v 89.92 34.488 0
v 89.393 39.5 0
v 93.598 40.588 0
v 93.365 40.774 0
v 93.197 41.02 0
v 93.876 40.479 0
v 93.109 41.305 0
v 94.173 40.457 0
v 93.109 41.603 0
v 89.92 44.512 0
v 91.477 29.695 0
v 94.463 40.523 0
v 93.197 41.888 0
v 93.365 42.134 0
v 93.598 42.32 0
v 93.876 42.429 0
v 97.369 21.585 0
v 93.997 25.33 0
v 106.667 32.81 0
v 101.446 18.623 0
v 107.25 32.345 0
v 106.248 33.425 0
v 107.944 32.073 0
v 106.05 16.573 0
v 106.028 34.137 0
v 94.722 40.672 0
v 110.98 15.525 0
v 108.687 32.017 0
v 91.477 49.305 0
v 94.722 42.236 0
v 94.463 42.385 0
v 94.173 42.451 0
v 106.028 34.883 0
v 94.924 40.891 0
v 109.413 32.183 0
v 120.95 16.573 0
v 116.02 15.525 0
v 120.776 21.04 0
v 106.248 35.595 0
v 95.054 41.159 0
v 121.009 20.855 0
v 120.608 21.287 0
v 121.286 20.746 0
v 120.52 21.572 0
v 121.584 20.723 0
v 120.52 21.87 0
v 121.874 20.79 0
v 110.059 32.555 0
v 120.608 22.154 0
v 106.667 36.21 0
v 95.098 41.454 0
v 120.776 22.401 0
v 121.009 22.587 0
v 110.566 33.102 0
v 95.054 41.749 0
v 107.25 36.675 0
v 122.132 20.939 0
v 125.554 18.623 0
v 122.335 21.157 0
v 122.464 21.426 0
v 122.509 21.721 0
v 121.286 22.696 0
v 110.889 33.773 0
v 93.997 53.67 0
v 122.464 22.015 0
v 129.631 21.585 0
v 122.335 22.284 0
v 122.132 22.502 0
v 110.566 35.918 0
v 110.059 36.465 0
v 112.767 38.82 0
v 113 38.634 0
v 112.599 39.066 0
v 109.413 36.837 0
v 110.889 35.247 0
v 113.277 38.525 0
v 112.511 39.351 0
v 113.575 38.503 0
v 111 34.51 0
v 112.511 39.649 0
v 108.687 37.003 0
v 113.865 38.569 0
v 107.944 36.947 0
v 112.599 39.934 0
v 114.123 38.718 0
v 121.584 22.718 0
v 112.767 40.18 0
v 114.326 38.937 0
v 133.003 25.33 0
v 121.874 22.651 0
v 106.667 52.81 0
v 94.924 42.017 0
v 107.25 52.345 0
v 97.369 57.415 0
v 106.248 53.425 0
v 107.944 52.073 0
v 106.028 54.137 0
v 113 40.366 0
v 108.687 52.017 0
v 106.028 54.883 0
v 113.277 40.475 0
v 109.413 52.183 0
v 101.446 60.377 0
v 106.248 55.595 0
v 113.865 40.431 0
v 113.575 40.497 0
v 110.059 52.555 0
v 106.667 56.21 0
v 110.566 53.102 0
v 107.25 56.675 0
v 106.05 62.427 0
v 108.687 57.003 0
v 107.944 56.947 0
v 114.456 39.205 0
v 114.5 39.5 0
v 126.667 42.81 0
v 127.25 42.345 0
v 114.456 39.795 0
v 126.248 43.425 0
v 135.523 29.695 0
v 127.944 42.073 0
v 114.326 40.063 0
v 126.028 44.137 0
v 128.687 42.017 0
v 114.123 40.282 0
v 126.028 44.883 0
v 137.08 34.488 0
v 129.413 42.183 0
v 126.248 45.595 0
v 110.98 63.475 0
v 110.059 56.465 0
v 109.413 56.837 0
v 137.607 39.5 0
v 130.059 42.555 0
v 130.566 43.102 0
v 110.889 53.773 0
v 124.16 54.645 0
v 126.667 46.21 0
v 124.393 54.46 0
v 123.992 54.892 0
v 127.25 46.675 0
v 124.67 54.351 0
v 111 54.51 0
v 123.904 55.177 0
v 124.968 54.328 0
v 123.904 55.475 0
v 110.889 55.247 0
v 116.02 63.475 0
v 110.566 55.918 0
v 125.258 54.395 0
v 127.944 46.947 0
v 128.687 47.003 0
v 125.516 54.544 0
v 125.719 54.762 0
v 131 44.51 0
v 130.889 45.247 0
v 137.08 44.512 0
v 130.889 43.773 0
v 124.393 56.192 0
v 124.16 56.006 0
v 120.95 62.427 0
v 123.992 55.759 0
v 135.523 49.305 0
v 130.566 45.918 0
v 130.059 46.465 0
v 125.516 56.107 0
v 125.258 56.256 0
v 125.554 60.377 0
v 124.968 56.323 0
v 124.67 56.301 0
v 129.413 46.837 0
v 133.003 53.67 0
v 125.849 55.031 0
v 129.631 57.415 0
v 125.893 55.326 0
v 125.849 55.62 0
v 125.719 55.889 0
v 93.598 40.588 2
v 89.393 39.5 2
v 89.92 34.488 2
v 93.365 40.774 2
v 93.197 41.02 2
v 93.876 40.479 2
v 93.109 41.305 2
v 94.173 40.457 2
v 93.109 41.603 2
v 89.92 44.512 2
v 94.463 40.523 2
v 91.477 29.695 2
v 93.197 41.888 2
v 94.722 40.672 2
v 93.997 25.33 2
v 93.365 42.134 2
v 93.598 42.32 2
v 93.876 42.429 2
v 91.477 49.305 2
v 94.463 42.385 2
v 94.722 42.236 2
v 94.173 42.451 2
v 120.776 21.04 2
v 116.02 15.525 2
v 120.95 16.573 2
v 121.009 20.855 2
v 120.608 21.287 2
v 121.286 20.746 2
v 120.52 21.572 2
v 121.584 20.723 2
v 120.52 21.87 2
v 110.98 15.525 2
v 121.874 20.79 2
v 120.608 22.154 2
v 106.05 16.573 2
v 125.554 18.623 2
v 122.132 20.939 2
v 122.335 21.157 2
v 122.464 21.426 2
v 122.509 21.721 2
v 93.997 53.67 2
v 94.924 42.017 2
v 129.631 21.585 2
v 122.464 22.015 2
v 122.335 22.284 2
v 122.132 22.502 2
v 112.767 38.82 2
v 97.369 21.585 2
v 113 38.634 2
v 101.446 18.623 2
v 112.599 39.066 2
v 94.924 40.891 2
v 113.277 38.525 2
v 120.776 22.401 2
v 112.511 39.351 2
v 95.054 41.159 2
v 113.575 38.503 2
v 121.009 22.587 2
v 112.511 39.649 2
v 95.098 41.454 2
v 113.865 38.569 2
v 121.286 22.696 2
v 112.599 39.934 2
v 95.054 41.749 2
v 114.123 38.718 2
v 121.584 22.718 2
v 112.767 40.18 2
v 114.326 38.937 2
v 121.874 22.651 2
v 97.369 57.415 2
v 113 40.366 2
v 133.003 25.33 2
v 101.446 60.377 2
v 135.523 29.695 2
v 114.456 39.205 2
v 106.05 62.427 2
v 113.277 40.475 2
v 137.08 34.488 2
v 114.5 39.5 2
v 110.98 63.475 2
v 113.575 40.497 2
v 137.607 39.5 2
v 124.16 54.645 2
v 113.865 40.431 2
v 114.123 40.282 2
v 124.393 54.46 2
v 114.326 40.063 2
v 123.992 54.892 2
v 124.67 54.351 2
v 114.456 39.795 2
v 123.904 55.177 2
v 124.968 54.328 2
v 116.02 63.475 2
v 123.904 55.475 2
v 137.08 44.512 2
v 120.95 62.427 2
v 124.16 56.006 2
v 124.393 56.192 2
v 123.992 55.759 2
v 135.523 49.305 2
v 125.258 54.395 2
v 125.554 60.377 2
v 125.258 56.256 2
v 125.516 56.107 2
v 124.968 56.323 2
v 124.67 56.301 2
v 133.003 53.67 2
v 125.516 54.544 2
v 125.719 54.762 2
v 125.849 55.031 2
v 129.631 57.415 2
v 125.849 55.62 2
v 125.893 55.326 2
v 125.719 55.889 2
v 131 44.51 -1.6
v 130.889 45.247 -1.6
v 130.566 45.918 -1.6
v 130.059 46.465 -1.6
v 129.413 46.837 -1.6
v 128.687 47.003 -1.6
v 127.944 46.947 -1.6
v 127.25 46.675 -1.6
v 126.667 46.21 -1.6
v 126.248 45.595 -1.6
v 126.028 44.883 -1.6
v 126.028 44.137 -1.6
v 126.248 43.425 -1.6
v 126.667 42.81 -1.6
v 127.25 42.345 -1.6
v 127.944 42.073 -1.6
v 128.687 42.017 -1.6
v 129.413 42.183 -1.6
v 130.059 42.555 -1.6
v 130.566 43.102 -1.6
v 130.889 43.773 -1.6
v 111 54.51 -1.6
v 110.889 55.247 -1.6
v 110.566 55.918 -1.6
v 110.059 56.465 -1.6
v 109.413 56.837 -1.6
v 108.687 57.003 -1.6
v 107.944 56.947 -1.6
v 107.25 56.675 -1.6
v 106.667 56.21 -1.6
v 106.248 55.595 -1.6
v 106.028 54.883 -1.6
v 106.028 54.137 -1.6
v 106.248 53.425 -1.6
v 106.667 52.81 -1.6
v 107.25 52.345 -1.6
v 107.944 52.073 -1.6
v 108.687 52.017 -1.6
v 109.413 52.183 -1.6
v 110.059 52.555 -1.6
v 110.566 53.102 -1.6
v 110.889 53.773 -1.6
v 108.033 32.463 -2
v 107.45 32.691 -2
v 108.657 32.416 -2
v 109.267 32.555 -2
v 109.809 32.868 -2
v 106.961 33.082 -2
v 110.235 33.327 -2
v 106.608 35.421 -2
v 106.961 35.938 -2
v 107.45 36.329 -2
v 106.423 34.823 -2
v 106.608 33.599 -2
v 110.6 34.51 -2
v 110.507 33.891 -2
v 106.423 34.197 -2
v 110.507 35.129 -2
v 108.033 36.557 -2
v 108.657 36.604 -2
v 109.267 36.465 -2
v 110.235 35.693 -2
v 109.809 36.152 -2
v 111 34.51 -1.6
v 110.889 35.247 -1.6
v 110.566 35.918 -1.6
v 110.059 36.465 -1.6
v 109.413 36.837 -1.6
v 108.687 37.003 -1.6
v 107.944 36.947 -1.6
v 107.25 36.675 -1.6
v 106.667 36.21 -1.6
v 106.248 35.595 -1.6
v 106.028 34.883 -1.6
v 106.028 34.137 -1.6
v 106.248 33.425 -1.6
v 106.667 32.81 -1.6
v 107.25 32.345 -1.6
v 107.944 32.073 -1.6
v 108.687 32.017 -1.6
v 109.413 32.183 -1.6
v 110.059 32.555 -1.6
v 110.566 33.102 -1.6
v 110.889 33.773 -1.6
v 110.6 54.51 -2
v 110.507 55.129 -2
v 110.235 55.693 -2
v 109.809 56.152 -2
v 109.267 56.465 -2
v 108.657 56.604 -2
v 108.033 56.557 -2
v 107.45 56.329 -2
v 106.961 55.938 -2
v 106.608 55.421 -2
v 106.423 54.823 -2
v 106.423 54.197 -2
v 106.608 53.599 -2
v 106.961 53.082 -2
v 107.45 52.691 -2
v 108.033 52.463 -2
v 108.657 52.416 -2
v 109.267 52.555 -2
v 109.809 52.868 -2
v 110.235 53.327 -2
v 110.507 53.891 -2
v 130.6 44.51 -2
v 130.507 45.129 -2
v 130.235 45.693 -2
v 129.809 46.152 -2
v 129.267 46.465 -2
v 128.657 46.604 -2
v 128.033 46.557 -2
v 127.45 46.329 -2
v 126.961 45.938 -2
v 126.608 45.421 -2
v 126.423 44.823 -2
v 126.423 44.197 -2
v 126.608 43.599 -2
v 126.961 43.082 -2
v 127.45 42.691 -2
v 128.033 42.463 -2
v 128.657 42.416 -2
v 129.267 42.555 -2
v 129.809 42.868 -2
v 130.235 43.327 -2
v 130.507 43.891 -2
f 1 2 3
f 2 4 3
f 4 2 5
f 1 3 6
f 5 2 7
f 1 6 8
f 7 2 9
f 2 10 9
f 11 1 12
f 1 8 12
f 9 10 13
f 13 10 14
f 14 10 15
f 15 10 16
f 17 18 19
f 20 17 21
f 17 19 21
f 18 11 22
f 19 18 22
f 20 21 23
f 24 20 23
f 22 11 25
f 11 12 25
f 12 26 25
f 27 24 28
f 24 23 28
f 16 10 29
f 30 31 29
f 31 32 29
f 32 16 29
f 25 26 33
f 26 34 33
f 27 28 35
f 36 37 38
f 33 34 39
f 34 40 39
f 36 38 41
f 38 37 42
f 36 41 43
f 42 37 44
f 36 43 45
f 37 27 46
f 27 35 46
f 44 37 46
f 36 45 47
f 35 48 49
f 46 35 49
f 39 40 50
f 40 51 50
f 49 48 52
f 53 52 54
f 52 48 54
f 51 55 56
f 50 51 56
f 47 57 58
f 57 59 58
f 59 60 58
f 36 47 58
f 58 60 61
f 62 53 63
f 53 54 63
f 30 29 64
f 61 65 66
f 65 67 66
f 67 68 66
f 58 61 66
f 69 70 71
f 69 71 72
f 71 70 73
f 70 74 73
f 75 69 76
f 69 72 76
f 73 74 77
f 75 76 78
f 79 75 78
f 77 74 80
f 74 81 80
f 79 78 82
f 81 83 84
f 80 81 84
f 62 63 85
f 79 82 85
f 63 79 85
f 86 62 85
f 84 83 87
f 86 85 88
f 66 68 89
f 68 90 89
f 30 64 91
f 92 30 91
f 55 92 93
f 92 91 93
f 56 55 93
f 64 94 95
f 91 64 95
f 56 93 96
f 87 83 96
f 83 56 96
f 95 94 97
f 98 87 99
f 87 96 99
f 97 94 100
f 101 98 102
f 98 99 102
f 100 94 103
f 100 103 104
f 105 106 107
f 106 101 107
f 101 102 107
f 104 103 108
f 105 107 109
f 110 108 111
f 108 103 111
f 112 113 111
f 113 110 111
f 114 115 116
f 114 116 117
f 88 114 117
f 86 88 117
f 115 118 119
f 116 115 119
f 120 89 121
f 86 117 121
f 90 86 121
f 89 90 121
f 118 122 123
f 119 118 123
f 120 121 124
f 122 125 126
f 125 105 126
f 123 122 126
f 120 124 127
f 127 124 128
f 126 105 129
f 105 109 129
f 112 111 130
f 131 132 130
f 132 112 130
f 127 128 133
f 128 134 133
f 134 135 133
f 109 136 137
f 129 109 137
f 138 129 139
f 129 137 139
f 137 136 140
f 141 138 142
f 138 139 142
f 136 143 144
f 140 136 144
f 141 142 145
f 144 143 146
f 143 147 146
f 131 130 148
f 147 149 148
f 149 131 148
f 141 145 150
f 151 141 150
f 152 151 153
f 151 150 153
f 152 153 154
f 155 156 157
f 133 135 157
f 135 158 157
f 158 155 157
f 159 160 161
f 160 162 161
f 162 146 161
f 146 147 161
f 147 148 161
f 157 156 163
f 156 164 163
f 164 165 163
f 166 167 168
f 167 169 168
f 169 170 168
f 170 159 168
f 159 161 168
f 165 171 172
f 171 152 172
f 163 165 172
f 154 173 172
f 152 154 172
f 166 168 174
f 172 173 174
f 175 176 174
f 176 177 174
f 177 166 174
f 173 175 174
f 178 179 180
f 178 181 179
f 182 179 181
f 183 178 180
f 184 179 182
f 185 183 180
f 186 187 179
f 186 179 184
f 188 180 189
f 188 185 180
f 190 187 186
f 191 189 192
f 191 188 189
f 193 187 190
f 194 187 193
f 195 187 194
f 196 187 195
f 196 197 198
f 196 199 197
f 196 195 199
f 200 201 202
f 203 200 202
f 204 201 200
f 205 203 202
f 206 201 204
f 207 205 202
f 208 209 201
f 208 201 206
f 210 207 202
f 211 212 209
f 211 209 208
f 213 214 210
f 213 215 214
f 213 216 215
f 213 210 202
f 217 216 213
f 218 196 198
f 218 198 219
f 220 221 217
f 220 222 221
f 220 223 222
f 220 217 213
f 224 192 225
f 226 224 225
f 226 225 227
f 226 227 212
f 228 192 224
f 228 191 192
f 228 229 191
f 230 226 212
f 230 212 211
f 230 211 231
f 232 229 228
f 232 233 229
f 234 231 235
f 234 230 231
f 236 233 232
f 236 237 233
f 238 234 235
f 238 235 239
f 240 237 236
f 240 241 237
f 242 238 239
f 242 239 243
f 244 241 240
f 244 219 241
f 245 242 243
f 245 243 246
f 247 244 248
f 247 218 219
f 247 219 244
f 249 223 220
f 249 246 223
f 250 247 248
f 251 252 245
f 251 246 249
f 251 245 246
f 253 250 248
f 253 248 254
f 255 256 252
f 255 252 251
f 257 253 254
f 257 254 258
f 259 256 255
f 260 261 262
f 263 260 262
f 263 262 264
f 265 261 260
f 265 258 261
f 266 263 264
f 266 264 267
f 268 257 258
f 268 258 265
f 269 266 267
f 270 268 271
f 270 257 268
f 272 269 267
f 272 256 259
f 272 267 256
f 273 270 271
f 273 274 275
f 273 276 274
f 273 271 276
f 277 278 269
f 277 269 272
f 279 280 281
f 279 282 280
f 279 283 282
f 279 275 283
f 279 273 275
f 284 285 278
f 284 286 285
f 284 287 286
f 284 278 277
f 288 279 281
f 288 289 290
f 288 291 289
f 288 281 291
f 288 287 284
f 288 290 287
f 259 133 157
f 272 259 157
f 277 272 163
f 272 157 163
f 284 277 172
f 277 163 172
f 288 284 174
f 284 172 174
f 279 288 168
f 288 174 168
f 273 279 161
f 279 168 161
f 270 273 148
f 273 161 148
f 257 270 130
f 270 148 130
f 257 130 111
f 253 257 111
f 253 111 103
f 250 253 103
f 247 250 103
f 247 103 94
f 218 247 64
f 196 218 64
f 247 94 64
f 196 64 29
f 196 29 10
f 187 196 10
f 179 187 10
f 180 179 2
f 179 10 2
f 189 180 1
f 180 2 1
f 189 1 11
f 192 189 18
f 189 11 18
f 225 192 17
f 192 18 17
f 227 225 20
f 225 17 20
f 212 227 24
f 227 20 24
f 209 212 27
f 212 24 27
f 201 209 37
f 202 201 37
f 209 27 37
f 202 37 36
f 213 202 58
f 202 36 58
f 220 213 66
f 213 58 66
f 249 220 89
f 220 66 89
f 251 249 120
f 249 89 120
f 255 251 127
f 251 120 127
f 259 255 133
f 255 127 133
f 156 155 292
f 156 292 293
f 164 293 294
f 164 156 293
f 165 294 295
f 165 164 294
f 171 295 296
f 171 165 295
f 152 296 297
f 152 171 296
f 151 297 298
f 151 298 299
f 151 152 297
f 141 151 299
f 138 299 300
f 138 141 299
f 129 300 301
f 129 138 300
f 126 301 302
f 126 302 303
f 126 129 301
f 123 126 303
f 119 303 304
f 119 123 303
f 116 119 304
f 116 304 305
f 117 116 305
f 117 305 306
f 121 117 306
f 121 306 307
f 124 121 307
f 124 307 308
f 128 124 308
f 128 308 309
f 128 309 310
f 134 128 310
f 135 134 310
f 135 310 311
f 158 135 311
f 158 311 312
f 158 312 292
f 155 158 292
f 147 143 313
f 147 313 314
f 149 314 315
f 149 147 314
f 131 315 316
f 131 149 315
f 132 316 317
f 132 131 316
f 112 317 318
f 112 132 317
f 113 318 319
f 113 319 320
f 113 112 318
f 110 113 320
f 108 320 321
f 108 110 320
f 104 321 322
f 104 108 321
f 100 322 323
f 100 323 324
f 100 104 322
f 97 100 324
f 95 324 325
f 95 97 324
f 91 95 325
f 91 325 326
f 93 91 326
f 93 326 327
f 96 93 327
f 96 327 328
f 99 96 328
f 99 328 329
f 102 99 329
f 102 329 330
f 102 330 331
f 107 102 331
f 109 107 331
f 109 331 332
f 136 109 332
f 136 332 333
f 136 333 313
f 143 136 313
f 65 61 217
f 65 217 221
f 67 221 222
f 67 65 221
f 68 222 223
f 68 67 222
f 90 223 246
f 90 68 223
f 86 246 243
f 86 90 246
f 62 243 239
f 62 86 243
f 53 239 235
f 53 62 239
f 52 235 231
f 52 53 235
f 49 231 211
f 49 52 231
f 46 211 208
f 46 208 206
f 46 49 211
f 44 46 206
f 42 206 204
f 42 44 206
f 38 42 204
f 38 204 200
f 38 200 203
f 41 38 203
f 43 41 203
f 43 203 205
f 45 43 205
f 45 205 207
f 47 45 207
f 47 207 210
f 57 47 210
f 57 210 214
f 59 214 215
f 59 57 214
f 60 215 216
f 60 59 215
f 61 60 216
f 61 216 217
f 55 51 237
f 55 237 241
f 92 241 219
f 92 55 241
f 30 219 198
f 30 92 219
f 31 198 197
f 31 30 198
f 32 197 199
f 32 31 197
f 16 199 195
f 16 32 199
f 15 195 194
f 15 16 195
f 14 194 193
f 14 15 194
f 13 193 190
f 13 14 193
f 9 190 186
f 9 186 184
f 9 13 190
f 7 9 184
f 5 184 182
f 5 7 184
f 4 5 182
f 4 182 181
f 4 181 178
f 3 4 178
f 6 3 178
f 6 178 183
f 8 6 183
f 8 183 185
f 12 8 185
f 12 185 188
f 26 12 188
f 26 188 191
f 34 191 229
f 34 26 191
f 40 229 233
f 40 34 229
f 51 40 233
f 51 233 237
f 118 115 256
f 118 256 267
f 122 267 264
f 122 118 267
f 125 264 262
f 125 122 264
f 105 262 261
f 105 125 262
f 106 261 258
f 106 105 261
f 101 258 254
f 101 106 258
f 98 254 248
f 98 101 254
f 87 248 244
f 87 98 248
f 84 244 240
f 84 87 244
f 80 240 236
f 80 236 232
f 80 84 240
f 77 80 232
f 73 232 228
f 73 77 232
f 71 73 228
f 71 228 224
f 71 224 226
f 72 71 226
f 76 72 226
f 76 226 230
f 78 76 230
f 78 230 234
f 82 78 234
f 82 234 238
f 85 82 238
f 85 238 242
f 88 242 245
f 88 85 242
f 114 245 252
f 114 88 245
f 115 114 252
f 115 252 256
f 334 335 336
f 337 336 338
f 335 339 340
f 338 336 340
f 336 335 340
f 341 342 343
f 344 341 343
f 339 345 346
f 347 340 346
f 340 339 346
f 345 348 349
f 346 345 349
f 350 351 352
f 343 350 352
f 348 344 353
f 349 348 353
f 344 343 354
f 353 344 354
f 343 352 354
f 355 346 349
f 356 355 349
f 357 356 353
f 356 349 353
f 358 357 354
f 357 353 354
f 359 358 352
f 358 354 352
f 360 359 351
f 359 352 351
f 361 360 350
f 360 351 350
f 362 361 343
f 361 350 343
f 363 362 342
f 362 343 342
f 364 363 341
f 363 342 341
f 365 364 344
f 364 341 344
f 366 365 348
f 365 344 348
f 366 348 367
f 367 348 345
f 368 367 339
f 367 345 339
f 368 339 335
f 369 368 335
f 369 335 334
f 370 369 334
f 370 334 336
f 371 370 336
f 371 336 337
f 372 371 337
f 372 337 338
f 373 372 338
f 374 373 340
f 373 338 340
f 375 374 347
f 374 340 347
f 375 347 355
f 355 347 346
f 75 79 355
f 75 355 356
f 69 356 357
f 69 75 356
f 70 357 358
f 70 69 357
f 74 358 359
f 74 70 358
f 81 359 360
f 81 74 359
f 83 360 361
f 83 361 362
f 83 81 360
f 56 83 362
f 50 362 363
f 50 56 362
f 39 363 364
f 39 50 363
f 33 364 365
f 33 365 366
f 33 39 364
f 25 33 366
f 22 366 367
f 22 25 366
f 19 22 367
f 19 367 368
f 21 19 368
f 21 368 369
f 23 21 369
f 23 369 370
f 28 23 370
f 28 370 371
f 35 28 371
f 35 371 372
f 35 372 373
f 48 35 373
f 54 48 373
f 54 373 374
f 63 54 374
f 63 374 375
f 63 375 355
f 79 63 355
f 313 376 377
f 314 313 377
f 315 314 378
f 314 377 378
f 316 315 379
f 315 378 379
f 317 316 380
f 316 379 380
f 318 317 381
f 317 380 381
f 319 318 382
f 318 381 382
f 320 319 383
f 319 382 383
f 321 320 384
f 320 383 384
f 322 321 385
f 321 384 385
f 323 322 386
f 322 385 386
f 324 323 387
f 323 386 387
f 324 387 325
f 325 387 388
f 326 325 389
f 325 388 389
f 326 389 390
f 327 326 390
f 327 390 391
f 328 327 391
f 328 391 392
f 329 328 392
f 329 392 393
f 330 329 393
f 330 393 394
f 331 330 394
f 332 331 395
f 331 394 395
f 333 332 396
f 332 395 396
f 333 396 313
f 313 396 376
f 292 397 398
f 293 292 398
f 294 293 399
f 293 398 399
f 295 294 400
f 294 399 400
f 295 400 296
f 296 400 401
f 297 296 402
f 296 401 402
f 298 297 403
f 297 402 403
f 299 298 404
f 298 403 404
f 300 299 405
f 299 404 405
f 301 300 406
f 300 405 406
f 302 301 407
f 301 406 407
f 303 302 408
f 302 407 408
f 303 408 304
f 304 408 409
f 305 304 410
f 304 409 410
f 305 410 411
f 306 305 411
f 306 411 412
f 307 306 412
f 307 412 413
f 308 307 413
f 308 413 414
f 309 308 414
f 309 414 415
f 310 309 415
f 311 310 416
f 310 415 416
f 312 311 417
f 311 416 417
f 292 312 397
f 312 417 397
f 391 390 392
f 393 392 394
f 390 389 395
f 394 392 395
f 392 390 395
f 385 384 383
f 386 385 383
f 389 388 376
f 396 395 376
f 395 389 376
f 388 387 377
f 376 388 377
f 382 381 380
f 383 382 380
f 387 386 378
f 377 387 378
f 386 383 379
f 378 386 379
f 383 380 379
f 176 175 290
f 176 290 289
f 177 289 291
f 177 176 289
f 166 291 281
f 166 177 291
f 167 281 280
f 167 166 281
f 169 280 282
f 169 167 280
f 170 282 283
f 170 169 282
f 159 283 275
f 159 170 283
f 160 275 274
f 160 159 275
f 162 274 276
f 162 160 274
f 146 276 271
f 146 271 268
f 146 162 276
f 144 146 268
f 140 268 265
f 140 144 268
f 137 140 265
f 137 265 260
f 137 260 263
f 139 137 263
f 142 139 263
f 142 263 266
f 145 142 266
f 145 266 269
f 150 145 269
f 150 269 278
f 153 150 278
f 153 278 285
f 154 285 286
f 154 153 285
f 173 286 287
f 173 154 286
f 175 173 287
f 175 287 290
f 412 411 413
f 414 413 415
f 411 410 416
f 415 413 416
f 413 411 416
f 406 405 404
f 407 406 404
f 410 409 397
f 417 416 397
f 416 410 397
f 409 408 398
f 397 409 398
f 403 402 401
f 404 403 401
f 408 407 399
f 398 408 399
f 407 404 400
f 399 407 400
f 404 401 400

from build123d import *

# Parameters (mm, degrees)
SKETCH_R     = 24.107232
SKETCH_R_2   = 1
PAD_DEPTH    = 2
SKETCH001_R  = 2.5
PAD001_DEPTH = 4
CHAMFER_SIZE = 0.4


with BuildPart() as part:
    # Sketch → Pad (new body)
    with BuildSketch(Plane.XY):
        with Locations((113.5, 39.5)):
            Circle(SKETCH_R)
        with Locations((124.893001, 55.325597)):
            Circle(SKETCH_R_2, mode=Mode.SUBTRACT)
        with Locations((94.09813, 41.45383)):
            Circle(SKETCH_R_2, mode=Mode.SUBTRACT)
        with Locations((121.508868, 21.720573)):
            Circle(SKETCH_R_2, mode=Mode.SUBTRACT)
        with Locations((113.5, 39.5)):
            Circle(SKETCH_R_2, mode=Mode.SUBTRACT)
    extrude(amount=PAD_DEPTH)

    # Sketch001 (on Face7 of Pad) → Pad001 (join)
    with BuildSketch(Plane.XY.offset(2)):
        with Locations((108.5, 34.51)):
            Circle(SKETCH001_R)
        with Locations((108.5, 54.51)):
            Circle(SKETCH001_R)
        with Locations((128.5, 44.51)):
            Circle(SKETCH001_R)
    extrude(amount=-PAD001_DEPTH)

    # Chamfer
    chamfer_edges = [part.edges().sort_by_distance(p)[0] for p in [
        (106, 34.51, -2),
        (106, 54.51, -2),
        (126, 44.51, -2),
    ]]
    chamfer(chamfer_edges, length=CHAMFER_SIZE)


solid = part.part
